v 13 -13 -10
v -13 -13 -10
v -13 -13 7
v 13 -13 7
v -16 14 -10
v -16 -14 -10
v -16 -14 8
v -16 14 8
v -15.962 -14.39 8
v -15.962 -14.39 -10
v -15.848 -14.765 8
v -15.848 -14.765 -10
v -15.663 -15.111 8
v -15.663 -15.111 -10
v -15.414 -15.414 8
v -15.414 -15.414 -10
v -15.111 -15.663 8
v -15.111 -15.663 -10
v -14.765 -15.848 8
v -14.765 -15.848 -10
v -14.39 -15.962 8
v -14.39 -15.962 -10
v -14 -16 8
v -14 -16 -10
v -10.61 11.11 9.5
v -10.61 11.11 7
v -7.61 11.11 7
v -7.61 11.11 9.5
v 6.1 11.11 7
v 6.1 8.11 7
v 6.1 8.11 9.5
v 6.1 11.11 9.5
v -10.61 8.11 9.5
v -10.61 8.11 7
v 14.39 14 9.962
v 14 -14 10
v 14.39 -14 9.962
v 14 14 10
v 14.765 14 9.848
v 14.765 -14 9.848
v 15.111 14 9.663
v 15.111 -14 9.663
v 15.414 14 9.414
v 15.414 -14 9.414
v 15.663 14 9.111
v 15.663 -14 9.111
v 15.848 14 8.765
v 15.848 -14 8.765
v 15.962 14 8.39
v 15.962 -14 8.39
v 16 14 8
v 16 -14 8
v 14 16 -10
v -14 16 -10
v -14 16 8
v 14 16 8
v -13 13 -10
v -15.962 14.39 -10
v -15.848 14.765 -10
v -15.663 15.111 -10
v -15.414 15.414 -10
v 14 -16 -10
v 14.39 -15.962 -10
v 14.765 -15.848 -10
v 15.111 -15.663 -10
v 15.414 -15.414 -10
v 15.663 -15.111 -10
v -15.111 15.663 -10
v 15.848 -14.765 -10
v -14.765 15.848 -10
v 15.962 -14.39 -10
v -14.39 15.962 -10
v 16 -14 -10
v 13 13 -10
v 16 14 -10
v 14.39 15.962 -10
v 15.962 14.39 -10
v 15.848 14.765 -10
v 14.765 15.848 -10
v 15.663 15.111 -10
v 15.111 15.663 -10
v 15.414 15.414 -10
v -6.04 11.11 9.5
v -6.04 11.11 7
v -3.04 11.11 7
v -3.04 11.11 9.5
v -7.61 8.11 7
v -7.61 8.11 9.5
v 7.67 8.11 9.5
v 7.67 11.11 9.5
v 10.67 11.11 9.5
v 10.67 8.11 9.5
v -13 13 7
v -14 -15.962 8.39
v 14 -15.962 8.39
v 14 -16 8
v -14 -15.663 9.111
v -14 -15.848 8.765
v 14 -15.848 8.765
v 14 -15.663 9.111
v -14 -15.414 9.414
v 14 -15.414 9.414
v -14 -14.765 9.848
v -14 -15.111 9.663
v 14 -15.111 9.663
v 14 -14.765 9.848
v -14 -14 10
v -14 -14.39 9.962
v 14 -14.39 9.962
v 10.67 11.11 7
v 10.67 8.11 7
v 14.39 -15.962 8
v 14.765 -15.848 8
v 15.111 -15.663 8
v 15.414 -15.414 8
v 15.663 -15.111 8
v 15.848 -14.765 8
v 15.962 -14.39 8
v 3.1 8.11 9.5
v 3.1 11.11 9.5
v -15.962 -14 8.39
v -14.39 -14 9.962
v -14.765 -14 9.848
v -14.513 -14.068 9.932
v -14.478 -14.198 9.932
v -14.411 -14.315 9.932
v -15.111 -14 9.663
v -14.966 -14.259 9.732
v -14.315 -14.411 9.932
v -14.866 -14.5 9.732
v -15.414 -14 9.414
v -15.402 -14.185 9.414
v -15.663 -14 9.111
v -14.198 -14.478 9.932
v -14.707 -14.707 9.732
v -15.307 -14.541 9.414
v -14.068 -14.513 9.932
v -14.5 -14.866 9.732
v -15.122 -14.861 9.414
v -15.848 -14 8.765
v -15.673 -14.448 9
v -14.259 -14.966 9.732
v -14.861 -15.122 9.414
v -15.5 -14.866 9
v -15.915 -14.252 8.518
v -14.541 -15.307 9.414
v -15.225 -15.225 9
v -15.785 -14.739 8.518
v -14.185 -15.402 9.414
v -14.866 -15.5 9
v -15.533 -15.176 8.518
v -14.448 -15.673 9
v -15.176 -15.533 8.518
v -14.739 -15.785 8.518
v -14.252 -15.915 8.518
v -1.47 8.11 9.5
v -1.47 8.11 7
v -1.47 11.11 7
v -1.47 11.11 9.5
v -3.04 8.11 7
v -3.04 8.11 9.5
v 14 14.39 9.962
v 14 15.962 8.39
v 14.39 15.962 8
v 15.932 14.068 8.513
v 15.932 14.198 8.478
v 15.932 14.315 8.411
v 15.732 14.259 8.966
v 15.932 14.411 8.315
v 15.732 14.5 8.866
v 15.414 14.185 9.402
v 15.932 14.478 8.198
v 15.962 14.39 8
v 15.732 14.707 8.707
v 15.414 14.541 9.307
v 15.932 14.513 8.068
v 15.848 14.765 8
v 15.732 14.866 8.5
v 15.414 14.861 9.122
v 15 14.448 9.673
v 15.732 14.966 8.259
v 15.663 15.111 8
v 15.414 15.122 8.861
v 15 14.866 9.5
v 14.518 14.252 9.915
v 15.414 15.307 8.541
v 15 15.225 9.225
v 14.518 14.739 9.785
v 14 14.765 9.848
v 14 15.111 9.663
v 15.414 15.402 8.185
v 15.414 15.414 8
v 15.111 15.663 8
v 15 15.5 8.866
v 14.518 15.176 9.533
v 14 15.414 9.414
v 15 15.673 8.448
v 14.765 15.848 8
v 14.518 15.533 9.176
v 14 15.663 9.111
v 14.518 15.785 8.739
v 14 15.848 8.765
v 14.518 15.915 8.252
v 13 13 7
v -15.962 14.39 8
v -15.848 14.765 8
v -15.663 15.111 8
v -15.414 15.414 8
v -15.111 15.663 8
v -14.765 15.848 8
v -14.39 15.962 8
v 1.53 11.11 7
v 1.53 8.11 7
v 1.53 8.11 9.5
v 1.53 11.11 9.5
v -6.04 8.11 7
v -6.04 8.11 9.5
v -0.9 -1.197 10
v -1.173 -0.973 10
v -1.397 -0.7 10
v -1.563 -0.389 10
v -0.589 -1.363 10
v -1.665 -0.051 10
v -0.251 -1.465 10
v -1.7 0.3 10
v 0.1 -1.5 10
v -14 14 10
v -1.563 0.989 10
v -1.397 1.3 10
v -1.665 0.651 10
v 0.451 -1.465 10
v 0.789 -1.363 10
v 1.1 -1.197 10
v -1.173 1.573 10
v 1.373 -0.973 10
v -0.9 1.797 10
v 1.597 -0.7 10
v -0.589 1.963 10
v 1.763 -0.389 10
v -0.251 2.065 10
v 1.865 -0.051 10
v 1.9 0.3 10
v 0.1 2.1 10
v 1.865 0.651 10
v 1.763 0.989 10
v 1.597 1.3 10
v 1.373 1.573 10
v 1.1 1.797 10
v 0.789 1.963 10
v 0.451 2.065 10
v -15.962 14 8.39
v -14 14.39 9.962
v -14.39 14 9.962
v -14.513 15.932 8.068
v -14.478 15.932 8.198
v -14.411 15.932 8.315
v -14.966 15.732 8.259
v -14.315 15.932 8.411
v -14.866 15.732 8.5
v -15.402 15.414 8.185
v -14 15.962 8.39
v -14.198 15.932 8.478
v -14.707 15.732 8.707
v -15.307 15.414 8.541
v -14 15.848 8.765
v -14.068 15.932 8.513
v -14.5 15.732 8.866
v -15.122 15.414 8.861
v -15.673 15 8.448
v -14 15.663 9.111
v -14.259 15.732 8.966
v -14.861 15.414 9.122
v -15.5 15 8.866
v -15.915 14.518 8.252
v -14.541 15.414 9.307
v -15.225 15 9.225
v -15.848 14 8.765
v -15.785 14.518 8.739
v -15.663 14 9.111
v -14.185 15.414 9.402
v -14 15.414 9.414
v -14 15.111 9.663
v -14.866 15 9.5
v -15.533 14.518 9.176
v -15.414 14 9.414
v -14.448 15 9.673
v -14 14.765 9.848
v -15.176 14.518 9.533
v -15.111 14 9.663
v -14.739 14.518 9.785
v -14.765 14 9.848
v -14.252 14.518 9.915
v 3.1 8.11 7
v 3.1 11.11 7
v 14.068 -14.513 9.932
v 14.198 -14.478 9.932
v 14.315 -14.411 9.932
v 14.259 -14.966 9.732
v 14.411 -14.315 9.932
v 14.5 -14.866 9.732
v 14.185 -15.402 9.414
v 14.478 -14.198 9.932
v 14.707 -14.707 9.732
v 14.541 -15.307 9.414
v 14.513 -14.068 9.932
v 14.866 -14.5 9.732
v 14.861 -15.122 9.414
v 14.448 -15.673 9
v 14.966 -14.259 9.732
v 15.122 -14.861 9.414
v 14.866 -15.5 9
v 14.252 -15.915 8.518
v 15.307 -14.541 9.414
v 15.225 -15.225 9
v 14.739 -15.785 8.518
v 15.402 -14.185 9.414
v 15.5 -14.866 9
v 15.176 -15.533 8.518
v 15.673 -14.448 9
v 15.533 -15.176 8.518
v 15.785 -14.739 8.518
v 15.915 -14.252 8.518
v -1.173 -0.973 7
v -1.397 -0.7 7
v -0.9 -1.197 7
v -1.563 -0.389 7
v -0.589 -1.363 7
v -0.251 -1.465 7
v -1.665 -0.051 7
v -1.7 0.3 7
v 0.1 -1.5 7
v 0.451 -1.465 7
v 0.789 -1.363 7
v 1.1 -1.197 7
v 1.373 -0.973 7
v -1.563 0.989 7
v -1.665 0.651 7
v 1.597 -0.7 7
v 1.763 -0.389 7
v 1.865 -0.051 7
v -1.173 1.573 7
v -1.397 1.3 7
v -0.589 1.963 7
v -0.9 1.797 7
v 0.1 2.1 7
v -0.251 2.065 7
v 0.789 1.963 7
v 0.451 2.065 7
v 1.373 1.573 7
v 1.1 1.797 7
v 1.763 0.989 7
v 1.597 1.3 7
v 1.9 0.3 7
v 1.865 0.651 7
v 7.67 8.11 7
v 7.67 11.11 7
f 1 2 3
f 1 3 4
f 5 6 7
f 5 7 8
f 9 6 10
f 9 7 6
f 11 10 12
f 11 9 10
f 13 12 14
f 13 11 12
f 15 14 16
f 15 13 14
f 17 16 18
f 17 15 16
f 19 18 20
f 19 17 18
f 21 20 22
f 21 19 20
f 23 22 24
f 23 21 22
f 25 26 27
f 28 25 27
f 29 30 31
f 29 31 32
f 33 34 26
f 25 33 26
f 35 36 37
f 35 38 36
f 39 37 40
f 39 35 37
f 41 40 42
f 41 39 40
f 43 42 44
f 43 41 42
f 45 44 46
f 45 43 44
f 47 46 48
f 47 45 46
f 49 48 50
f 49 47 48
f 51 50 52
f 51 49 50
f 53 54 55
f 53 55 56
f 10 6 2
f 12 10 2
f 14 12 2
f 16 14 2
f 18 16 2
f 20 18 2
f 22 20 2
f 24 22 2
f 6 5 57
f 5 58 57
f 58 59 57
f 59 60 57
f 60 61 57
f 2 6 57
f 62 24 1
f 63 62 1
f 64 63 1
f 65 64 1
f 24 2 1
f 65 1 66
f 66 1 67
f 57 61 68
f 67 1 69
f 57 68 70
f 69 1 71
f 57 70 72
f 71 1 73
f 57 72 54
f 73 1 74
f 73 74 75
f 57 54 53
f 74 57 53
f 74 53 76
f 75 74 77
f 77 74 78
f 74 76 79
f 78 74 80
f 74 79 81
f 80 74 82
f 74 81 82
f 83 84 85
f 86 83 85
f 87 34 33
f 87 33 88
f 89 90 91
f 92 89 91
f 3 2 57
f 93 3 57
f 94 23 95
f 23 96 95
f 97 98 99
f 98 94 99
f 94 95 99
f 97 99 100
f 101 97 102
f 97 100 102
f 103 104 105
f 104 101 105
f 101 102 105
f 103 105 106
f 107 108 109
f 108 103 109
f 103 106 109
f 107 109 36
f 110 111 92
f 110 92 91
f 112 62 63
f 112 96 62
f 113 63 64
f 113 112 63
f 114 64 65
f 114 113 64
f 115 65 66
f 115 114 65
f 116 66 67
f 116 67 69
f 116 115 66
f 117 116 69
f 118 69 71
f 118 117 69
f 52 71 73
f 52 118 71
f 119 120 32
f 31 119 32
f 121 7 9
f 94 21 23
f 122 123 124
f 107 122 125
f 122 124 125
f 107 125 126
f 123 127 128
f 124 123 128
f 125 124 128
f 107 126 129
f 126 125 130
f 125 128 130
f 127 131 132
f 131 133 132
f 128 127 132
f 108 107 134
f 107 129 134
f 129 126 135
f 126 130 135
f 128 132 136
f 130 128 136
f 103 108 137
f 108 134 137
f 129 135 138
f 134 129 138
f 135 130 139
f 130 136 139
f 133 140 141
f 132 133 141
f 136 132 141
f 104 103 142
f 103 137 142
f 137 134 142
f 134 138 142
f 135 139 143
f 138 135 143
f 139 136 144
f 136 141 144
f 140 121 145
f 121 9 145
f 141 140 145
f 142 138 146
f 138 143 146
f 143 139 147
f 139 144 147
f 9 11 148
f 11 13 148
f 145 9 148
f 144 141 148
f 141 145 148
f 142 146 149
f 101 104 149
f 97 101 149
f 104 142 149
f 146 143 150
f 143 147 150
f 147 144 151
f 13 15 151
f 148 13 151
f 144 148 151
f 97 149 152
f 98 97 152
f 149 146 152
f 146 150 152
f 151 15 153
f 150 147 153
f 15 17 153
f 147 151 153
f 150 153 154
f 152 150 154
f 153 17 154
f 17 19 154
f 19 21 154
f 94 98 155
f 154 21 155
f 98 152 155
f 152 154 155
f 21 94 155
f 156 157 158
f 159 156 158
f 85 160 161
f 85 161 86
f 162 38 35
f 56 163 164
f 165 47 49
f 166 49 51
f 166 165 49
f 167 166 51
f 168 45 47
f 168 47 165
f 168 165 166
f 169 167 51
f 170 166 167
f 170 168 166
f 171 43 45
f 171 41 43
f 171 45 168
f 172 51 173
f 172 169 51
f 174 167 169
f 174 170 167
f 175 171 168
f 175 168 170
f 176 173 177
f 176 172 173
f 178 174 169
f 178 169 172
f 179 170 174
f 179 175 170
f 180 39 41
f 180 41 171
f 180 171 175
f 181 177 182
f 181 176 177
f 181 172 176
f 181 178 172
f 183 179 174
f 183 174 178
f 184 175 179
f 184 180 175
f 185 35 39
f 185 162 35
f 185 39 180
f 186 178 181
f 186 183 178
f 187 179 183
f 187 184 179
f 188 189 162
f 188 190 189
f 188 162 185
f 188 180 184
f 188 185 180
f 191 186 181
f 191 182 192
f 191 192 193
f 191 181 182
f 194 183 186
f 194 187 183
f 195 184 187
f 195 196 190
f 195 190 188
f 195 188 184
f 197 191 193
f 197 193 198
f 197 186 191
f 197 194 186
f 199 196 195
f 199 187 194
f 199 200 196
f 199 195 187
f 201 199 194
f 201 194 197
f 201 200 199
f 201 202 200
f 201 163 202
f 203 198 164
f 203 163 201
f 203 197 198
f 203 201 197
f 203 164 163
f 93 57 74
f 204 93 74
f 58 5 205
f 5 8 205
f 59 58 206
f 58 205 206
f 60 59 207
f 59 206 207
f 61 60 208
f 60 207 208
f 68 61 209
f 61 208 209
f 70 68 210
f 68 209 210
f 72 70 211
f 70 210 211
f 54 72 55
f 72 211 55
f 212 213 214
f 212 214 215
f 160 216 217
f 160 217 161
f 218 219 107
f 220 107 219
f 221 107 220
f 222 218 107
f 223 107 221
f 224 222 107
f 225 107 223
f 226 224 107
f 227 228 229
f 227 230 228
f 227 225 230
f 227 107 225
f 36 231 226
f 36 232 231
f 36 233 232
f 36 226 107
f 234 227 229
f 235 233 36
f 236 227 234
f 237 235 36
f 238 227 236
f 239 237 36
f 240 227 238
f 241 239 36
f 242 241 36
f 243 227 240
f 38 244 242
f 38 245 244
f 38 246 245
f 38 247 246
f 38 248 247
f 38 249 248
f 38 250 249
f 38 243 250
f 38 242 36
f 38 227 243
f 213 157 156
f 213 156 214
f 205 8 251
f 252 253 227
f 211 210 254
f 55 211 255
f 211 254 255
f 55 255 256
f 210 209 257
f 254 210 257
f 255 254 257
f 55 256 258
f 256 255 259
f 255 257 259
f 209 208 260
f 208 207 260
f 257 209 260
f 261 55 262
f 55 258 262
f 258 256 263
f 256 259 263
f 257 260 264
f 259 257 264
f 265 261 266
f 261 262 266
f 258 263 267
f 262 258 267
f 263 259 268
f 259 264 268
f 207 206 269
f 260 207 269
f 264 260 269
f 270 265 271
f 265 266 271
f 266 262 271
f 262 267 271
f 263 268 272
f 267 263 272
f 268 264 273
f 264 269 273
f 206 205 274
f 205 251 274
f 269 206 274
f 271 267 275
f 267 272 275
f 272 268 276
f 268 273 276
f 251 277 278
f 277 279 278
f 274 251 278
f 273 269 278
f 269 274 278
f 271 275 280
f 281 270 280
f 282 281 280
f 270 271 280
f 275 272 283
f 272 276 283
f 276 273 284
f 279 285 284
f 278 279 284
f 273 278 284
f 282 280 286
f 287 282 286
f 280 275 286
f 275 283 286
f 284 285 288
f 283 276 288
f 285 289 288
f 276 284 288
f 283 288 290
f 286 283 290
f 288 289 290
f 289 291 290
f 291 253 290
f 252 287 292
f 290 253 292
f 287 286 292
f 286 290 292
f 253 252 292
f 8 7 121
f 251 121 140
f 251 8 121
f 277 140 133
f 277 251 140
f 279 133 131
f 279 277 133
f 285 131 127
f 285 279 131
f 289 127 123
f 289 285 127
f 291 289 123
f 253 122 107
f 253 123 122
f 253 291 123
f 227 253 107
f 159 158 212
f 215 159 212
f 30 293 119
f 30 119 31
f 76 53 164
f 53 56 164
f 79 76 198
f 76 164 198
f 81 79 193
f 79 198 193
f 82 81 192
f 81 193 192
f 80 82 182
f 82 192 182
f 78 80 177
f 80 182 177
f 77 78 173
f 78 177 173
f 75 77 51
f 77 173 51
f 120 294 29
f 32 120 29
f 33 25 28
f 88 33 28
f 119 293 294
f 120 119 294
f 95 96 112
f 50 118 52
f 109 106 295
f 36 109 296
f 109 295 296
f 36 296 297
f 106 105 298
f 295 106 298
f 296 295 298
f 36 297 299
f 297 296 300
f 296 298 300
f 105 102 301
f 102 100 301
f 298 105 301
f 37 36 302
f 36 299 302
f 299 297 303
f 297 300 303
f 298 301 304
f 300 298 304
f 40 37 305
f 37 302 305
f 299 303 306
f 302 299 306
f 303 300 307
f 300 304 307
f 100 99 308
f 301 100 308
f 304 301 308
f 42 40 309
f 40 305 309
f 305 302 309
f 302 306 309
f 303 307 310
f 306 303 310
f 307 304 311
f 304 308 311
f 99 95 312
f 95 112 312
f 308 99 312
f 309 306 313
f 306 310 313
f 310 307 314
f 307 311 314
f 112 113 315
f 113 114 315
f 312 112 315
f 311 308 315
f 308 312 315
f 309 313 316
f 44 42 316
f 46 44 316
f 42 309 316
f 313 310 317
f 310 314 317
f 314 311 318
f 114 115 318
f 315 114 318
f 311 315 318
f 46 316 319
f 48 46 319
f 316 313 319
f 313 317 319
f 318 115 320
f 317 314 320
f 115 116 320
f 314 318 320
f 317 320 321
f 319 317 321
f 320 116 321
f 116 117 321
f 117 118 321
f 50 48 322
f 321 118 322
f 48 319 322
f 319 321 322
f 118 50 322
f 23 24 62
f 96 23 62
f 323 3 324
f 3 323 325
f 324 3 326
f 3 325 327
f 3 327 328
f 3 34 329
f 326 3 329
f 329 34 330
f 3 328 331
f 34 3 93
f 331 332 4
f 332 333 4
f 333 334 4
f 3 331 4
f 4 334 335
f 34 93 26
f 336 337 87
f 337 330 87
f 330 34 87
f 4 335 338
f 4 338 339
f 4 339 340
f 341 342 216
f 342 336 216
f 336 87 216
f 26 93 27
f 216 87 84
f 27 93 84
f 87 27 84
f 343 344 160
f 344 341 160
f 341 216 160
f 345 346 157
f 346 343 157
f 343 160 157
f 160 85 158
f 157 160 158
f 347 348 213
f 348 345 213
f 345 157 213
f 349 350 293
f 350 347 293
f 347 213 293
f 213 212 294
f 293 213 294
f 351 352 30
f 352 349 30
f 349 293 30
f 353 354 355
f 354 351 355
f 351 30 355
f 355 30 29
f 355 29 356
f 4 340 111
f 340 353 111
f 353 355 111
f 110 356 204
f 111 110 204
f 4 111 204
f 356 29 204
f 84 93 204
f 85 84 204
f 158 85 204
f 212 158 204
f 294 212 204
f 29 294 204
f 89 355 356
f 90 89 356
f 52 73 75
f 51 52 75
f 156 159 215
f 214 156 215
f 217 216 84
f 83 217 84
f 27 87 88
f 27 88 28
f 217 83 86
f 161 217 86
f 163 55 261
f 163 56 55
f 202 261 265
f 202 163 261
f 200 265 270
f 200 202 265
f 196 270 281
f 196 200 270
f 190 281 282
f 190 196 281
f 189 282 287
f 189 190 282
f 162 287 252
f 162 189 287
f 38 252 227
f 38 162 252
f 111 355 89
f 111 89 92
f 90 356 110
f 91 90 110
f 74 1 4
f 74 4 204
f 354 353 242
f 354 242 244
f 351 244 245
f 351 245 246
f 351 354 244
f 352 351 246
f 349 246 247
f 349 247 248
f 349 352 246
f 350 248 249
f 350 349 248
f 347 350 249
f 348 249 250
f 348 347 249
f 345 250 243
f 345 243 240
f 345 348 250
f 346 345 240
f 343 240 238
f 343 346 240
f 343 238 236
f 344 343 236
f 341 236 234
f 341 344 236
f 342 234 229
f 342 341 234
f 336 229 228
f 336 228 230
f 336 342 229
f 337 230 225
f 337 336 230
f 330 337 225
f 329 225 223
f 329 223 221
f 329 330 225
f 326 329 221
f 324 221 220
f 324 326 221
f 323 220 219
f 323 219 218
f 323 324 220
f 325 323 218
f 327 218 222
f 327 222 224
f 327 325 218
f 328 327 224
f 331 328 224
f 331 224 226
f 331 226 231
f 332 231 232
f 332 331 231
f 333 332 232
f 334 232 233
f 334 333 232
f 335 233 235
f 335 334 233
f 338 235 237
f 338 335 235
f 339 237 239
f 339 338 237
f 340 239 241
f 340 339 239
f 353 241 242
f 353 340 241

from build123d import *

# Parameters (mm, degrees)
CYLINDER001_R     = 1.8
CYLINDER001_DEPTH = 3
BOX006_W          = 3
BOX006_H          = 3
BOX006_DEPTH      = 3
BOX005_W          = 3
BOX005_H          = 3
BOX005_DEPTH      = 3
BOX003_W          = 3
BOX003_H          = 3
BOX003_DEPTH      = 3
BOX004_W          = 3
BOX004_H          = 3
BOX004_DEPTH      = 3
BOX002_W          = 3
BOX002_H          = 3
BOX002_DEPTH      = 3
BOX_W             = 26
BOX_H             = 26
BOX_DEPTH         = 17
BOX001_W          = 32
BOX001_H          = 32
BOX001_DEPTH      = 20
FILLET003_R       = 2


with BuildPart() as buttouch:
    # Cylinder001 → Cylinder001 (new body)
    with BuildSketch(Plane(origin=(0.1, 0.3, 7), x_dir=(1, 0, 0), z_dir=(0, 0, 1))):
        Circle(CYLINDER001_R)
    extrude(amount=CYLINDER001_DEPTH)


with BuildPart() as l5:
    # Box006 → Box006 (new body)
    with BuildSketch(Plane(origin=(7.67, 8.11, 6.5), x_dir=(1, 0, 0), z_dir=(0, 0, 1))):
        with Locations((1.5, 1.5)):
            Rectangle(BOX006_W, BOX006_H)
    extrude(amount=BOX006_DEPTH)


with BuildPart() as l4:
    # Box005 → Box005 (new body)
    with BuildSketch(Plane(origin=(3.1, 8.11, 6.5), x_dir=(1, 0, 0), z_dir=(0, 0, 1))):
        with Locations((1.5, 1.5)):
            Rectangle(BOX005_W, BOX005_H)
    extrude(amount=BOX005_DEPTH)


with BuildPart() as l2:
    # Box003 → Box003 (new body)
    with BuildSketch(Plane(origin=(-6.04, 8.11, 6.5), x_dir=(1, 0, 0), z_dir=(0, 0, 1))):
        with Locations((1.5, 1.5)):
            Rectangle(BOX003_W, BOX003_H)
    extrude(amount=BOX003_DEPTH)


with BuildPart() as l3:
    # Box004 → Box004 (new body)
    with BuildSketch(Plane(origin=(-1.47, 8.11, 6.5), x_dir=(1, 0, 0), z_dir=(0, 0, 1))):
        with Locations((1.5, 1.5)):
            Rectangle(BOX004_W, BOX004_H)
    extrude(amount=BOX004_DEPTH)


with BuildPart() as fusion:
    # Box002 → Box002 (new body)
    with BuildSketch(Plane(origin=(-10.61, 8.11, 6.5), x_dir=(1, 0, 0), z_dir=(0, 0, 1))):
        with Locations((1.5, 1.5)):
            Rectangle(BOX002_W, BOX002_H)
    extrude(amount=BOX002_DEPTH)

    # Fusion: union L5, L4, L2, L3
    add(l5.part)
    add(l4.part)
    add(l2.part)
    add(l3.part)


with BuildPart() as maininside:
    # Box → Box (new body)
    with BuildSketch(Plane(origin=(-13, -13, -10), x_dir=(1, 0, 0), z_dir=(0, 0, 1))):
        with Locations((13, 13)):
            Rectangle(BOX_W, BOX_H)
    extrude(amount=BOX_DEPTH)


with BuildPart() as fillet003:
    # Box001 → Box001 (new body)
    with BuildSketch(Plane(origin=(-16, -16, -10), x_dir=(1, 0, 0), z_dir=(0, 0, 1))):
        with Locations((16, 16)):
            Rectangle(BOX001_W, BOX001_H)
    extrude(amount=BOX001_DEPTH)

    # Cut: cut MainInside
    add(maininside.part, mode=Mode.SUBTRACT)

    # Cut001: cut Fusion
    add(fusion.part, mode=Mode.SUBTRACT)

    # Cut002: cut ButTouch
    add(buttouch.part, mode=Mode.SUBTRACT)

    # Fillet003
    fillet003_edges = [fillet003.edges().sort_by_distance(p)[0] for p in [
        (-16, -16, 0),
        (-16, 0, 10),
        (-16, 16, 0),
        (16, -16, 0),
        (0, -16, 10),
        (0, 16, 10),
        (16, 0, 10),
        (16, 16, 0),
    ]]
    fillet(fillet003_edges, radius=FILLET003_R)


solid = fillet003.part
